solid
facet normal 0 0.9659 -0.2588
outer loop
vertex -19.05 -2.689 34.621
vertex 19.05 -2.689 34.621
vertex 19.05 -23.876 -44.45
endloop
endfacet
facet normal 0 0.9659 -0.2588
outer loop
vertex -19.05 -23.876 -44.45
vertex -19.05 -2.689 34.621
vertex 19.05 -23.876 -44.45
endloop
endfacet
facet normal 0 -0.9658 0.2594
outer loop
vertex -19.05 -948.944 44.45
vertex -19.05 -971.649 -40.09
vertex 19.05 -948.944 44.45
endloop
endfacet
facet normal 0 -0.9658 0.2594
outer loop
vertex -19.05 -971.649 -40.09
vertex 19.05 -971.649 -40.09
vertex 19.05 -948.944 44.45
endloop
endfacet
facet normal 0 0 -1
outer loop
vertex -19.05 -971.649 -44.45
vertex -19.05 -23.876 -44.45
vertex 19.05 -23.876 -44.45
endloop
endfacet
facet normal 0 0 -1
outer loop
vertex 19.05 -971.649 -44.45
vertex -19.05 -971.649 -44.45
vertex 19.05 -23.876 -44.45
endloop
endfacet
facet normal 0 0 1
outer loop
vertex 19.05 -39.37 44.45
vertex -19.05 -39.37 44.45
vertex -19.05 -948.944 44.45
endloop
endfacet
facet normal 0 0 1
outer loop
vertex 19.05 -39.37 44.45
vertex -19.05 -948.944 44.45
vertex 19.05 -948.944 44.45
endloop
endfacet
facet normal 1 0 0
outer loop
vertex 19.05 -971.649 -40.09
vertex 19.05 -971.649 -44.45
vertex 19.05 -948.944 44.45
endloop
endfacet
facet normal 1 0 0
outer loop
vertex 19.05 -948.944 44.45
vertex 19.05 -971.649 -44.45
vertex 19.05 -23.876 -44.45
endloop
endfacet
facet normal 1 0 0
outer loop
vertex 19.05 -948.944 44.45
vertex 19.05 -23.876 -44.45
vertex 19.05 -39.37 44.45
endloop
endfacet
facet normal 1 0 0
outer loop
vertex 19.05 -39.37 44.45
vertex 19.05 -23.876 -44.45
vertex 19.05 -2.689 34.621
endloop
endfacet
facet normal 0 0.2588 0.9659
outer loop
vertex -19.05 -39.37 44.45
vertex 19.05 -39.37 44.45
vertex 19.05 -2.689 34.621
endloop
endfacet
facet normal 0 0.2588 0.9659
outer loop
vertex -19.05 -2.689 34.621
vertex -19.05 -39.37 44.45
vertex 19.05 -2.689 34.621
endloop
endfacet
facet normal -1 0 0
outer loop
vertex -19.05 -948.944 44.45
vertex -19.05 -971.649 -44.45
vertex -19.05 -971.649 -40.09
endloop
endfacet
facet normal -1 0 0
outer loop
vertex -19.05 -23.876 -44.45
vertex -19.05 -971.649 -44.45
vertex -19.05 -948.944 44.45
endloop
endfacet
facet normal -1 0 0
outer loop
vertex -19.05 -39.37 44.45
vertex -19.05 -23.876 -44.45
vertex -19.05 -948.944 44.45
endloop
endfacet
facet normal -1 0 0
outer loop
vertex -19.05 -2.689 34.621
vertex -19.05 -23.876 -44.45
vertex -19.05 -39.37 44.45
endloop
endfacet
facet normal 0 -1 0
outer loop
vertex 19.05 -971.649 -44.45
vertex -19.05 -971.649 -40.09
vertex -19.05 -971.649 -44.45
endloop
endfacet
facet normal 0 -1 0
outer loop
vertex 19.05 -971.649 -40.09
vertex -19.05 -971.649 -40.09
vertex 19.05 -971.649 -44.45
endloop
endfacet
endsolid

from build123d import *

# Parameters (mm, degrees)
F0_W     = 38.1
F0_H     = 88.9
F1_DEPTH = 971.64906
F3_DEPTH = 25.4
F5_DEPTH = 25.4


with BuildPart() as f1:
    # F0 (on Front) → F1 (new body)
    with BuildSketch(Plane.XZ):
        Rectangle(F0_W, F0_H)
    extrude(amount=F1_DEPTH)

    # F2 (on Right) → F3 (cut, symmetric)
    with BuildSketch(Plane.YZ):
        Polygon((-972.82, -44.45), (-948.944, 44.45), (-972.82, 44.45), align=None)
    extrude(amount=F3_DEPTH, both=True, mode=Mode.SUBTRACT)

    # F4 (on Right) → F5 (cut, symmetric)
    with BuildSketch(Plane.YZ):
        Polygon((-23.876, -44.45), (0, -44.45), (0, 44.45), (-39.37, 44.45), (-2.688901, 34.621329), align=None)
    extrude(amount=F5_DEPTH, both=True, mode=Mode.SUBTRACT)


solid = f1.part
